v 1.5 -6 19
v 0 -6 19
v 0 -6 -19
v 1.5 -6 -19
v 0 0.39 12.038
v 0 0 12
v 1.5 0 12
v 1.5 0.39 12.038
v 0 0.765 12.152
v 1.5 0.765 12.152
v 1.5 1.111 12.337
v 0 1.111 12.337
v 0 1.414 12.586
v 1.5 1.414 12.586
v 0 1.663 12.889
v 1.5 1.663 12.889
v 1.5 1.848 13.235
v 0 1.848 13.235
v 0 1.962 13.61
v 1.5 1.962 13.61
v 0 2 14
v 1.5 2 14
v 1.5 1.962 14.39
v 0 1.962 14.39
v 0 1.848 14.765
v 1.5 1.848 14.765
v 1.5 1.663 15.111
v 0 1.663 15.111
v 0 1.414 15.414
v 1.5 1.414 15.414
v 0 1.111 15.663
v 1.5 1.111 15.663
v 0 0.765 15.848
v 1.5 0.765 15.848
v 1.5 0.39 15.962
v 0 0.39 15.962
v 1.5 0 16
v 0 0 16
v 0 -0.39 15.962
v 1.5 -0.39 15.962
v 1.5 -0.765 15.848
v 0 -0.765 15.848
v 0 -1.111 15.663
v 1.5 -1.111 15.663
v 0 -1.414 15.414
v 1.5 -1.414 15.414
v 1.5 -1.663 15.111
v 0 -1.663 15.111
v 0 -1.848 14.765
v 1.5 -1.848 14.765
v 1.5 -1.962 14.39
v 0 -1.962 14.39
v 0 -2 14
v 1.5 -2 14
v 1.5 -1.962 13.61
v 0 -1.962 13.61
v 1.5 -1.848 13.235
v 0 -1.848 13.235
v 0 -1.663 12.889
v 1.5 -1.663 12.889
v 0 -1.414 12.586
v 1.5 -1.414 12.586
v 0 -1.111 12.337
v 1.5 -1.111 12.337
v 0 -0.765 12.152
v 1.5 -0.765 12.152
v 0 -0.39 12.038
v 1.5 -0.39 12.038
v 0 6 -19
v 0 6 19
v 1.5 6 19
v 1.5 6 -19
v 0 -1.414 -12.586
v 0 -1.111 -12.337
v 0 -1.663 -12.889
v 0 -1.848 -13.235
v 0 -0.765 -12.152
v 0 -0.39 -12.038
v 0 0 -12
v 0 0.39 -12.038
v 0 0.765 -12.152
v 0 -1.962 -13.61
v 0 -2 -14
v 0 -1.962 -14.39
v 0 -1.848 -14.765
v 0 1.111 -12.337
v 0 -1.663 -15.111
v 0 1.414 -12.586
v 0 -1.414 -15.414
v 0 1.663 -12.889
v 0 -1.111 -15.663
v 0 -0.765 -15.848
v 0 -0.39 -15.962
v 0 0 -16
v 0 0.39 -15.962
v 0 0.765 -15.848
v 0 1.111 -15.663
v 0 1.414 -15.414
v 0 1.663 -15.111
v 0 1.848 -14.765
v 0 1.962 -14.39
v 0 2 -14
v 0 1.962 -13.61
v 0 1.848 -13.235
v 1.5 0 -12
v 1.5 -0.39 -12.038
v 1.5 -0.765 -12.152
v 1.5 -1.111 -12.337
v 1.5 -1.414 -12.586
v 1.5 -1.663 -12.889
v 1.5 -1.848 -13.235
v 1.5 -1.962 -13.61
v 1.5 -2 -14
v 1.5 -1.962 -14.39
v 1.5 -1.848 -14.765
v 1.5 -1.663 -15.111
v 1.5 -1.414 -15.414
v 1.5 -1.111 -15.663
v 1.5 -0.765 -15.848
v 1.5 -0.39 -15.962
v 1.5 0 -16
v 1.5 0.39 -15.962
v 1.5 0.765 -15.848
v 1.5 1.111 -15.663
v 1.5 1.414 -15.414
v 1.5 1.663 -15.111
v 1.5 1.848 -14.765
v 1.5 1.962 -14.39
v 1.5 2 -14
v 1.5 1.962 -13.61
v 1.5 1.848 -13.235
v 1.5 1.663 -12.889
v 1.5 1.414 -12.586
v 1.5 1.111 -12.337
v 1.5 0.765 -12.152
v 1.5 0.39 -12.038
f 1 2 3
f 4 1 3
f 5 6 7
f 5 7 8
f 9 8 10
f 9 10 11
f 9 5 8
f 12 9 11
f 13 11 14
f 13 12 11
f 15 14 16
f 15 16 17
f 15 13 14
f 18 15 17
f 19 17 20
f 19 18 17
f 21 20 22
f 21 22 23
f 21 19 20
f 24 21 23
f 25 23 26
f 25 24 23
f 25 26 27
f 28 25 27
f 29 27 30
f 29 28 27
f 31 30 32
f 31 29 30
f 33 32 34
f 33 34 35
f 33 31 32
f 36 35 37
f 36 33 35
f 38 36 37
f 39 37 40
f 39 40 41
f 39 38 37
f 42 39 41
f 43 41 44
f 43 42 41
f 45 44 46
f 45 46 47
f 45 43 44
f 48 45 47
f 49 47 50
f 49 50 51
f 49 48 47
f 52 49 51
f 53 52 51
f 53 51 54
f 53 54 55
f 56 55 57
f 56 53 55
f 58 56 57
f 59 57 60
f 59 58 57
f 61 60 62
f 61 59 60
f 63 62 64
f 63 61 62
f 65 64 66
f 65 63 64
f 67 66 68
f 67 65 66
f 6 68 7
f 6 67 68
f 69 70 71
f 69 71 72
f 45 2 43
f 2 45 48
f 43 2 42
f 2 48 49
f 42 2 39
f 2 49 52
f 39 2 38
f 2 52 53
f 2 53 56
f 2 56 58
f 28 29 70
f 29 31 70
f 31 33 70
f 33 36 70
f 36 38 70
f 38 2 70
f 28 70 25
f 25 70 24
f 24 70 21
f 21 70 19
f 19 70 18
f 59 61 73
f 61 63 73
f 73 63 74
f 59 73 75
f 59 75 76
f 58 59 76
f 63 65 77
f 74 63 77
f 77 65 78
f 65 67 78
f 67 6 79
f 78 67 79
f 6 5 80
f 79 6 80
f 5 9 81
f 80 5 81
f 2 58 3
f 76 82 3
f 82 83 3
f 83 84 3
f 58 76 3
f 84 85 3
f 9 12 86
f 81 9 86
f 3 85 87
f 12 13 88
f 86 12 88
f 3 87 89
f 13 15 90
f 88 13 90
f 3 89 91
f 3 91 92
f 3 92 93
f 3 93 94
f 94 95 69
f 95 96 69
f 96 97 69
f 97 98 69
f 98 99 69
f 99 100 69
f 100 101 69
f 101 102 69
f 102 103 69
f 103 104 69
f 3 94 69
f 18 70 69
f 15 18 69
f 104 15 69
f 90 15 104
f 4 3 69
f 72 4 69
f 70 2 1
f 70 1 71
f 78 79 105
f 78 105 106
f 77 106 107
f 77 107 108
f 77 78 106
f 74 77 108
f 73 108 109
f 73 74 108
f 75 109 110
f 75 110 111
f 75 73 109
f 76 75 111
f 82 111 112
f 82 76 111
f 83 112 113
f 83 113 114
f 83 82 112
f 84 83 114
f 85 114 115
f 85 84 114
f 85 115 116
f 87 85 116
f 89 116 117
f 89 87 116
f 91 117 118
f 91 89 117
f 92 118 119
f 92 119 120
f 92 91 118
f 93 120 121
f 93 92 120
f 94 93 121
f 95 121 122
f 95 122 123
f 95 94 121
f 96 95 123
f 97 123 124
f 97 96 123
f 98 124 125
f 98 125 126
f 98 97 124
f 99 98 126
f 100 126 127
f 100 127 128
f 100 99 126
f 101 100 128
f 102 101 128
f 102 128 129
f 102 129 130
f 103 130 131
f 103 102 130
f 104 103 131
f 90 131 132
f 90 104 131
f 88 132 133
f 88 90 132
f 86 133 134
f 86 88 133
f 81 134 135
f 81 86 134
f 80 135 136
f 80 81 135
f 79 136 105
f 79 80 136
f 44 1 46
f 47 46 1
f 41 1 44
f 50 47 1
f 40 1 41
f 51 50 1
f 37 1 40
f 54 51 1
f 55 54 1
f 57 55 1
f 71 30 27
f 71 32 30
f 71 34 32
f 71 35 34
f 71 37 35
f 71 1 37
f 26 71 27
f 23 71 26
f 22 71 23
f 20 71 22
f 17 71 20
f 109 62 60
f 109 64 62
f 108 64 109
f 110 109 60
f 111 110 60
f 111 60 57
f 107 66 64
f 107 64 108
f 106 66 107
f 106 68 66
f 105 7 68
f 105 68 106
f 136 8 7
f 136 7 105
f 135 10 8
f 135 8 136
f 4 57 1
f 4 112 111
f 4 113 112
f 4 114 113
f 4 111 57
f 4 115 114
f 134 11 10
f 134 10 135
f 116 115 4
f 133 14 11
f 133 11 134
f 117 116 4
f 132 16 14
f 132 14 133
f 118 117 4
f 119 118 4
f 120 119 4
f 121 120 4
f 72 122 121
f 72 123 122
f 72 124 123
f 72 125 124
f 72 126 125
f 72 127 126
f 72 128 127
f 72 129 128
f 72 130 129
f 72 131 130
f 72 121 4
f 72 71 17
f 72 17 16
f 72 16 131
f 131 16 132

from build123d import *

# Parameters (mm, degrees)
ESBO_O1_W                = 38
ESBO_O1_H                = 12
ESBO_O1_R                = 2
RESSALTO_EXTRUS_O1_DEPTH = 1.5


with BuildPart() as part:
    # Esboço1 → Ressalto-extrusão1 (new body)
    with BuildSketch(Plane(origin=(0, 0, 0), x_dir=(0, 0, -1), z_dir=(1, 0, 0))):
        Rectangle(ESBO_O1_W, ESBO_O1_H)
        with Locations((-14, 0)):
            Circle(ESBO_O1_R, mode=Mode.SUBTRACT)
        with Locations(Location((14, 0, 0), (0, 0, 180))):
            Circle(ESBO_O1_R, mode=Mode.SUBTRACT)
    extrude(amount=RESSALTO_EXTRUS_O1_DEPTH)


solid = part.part
